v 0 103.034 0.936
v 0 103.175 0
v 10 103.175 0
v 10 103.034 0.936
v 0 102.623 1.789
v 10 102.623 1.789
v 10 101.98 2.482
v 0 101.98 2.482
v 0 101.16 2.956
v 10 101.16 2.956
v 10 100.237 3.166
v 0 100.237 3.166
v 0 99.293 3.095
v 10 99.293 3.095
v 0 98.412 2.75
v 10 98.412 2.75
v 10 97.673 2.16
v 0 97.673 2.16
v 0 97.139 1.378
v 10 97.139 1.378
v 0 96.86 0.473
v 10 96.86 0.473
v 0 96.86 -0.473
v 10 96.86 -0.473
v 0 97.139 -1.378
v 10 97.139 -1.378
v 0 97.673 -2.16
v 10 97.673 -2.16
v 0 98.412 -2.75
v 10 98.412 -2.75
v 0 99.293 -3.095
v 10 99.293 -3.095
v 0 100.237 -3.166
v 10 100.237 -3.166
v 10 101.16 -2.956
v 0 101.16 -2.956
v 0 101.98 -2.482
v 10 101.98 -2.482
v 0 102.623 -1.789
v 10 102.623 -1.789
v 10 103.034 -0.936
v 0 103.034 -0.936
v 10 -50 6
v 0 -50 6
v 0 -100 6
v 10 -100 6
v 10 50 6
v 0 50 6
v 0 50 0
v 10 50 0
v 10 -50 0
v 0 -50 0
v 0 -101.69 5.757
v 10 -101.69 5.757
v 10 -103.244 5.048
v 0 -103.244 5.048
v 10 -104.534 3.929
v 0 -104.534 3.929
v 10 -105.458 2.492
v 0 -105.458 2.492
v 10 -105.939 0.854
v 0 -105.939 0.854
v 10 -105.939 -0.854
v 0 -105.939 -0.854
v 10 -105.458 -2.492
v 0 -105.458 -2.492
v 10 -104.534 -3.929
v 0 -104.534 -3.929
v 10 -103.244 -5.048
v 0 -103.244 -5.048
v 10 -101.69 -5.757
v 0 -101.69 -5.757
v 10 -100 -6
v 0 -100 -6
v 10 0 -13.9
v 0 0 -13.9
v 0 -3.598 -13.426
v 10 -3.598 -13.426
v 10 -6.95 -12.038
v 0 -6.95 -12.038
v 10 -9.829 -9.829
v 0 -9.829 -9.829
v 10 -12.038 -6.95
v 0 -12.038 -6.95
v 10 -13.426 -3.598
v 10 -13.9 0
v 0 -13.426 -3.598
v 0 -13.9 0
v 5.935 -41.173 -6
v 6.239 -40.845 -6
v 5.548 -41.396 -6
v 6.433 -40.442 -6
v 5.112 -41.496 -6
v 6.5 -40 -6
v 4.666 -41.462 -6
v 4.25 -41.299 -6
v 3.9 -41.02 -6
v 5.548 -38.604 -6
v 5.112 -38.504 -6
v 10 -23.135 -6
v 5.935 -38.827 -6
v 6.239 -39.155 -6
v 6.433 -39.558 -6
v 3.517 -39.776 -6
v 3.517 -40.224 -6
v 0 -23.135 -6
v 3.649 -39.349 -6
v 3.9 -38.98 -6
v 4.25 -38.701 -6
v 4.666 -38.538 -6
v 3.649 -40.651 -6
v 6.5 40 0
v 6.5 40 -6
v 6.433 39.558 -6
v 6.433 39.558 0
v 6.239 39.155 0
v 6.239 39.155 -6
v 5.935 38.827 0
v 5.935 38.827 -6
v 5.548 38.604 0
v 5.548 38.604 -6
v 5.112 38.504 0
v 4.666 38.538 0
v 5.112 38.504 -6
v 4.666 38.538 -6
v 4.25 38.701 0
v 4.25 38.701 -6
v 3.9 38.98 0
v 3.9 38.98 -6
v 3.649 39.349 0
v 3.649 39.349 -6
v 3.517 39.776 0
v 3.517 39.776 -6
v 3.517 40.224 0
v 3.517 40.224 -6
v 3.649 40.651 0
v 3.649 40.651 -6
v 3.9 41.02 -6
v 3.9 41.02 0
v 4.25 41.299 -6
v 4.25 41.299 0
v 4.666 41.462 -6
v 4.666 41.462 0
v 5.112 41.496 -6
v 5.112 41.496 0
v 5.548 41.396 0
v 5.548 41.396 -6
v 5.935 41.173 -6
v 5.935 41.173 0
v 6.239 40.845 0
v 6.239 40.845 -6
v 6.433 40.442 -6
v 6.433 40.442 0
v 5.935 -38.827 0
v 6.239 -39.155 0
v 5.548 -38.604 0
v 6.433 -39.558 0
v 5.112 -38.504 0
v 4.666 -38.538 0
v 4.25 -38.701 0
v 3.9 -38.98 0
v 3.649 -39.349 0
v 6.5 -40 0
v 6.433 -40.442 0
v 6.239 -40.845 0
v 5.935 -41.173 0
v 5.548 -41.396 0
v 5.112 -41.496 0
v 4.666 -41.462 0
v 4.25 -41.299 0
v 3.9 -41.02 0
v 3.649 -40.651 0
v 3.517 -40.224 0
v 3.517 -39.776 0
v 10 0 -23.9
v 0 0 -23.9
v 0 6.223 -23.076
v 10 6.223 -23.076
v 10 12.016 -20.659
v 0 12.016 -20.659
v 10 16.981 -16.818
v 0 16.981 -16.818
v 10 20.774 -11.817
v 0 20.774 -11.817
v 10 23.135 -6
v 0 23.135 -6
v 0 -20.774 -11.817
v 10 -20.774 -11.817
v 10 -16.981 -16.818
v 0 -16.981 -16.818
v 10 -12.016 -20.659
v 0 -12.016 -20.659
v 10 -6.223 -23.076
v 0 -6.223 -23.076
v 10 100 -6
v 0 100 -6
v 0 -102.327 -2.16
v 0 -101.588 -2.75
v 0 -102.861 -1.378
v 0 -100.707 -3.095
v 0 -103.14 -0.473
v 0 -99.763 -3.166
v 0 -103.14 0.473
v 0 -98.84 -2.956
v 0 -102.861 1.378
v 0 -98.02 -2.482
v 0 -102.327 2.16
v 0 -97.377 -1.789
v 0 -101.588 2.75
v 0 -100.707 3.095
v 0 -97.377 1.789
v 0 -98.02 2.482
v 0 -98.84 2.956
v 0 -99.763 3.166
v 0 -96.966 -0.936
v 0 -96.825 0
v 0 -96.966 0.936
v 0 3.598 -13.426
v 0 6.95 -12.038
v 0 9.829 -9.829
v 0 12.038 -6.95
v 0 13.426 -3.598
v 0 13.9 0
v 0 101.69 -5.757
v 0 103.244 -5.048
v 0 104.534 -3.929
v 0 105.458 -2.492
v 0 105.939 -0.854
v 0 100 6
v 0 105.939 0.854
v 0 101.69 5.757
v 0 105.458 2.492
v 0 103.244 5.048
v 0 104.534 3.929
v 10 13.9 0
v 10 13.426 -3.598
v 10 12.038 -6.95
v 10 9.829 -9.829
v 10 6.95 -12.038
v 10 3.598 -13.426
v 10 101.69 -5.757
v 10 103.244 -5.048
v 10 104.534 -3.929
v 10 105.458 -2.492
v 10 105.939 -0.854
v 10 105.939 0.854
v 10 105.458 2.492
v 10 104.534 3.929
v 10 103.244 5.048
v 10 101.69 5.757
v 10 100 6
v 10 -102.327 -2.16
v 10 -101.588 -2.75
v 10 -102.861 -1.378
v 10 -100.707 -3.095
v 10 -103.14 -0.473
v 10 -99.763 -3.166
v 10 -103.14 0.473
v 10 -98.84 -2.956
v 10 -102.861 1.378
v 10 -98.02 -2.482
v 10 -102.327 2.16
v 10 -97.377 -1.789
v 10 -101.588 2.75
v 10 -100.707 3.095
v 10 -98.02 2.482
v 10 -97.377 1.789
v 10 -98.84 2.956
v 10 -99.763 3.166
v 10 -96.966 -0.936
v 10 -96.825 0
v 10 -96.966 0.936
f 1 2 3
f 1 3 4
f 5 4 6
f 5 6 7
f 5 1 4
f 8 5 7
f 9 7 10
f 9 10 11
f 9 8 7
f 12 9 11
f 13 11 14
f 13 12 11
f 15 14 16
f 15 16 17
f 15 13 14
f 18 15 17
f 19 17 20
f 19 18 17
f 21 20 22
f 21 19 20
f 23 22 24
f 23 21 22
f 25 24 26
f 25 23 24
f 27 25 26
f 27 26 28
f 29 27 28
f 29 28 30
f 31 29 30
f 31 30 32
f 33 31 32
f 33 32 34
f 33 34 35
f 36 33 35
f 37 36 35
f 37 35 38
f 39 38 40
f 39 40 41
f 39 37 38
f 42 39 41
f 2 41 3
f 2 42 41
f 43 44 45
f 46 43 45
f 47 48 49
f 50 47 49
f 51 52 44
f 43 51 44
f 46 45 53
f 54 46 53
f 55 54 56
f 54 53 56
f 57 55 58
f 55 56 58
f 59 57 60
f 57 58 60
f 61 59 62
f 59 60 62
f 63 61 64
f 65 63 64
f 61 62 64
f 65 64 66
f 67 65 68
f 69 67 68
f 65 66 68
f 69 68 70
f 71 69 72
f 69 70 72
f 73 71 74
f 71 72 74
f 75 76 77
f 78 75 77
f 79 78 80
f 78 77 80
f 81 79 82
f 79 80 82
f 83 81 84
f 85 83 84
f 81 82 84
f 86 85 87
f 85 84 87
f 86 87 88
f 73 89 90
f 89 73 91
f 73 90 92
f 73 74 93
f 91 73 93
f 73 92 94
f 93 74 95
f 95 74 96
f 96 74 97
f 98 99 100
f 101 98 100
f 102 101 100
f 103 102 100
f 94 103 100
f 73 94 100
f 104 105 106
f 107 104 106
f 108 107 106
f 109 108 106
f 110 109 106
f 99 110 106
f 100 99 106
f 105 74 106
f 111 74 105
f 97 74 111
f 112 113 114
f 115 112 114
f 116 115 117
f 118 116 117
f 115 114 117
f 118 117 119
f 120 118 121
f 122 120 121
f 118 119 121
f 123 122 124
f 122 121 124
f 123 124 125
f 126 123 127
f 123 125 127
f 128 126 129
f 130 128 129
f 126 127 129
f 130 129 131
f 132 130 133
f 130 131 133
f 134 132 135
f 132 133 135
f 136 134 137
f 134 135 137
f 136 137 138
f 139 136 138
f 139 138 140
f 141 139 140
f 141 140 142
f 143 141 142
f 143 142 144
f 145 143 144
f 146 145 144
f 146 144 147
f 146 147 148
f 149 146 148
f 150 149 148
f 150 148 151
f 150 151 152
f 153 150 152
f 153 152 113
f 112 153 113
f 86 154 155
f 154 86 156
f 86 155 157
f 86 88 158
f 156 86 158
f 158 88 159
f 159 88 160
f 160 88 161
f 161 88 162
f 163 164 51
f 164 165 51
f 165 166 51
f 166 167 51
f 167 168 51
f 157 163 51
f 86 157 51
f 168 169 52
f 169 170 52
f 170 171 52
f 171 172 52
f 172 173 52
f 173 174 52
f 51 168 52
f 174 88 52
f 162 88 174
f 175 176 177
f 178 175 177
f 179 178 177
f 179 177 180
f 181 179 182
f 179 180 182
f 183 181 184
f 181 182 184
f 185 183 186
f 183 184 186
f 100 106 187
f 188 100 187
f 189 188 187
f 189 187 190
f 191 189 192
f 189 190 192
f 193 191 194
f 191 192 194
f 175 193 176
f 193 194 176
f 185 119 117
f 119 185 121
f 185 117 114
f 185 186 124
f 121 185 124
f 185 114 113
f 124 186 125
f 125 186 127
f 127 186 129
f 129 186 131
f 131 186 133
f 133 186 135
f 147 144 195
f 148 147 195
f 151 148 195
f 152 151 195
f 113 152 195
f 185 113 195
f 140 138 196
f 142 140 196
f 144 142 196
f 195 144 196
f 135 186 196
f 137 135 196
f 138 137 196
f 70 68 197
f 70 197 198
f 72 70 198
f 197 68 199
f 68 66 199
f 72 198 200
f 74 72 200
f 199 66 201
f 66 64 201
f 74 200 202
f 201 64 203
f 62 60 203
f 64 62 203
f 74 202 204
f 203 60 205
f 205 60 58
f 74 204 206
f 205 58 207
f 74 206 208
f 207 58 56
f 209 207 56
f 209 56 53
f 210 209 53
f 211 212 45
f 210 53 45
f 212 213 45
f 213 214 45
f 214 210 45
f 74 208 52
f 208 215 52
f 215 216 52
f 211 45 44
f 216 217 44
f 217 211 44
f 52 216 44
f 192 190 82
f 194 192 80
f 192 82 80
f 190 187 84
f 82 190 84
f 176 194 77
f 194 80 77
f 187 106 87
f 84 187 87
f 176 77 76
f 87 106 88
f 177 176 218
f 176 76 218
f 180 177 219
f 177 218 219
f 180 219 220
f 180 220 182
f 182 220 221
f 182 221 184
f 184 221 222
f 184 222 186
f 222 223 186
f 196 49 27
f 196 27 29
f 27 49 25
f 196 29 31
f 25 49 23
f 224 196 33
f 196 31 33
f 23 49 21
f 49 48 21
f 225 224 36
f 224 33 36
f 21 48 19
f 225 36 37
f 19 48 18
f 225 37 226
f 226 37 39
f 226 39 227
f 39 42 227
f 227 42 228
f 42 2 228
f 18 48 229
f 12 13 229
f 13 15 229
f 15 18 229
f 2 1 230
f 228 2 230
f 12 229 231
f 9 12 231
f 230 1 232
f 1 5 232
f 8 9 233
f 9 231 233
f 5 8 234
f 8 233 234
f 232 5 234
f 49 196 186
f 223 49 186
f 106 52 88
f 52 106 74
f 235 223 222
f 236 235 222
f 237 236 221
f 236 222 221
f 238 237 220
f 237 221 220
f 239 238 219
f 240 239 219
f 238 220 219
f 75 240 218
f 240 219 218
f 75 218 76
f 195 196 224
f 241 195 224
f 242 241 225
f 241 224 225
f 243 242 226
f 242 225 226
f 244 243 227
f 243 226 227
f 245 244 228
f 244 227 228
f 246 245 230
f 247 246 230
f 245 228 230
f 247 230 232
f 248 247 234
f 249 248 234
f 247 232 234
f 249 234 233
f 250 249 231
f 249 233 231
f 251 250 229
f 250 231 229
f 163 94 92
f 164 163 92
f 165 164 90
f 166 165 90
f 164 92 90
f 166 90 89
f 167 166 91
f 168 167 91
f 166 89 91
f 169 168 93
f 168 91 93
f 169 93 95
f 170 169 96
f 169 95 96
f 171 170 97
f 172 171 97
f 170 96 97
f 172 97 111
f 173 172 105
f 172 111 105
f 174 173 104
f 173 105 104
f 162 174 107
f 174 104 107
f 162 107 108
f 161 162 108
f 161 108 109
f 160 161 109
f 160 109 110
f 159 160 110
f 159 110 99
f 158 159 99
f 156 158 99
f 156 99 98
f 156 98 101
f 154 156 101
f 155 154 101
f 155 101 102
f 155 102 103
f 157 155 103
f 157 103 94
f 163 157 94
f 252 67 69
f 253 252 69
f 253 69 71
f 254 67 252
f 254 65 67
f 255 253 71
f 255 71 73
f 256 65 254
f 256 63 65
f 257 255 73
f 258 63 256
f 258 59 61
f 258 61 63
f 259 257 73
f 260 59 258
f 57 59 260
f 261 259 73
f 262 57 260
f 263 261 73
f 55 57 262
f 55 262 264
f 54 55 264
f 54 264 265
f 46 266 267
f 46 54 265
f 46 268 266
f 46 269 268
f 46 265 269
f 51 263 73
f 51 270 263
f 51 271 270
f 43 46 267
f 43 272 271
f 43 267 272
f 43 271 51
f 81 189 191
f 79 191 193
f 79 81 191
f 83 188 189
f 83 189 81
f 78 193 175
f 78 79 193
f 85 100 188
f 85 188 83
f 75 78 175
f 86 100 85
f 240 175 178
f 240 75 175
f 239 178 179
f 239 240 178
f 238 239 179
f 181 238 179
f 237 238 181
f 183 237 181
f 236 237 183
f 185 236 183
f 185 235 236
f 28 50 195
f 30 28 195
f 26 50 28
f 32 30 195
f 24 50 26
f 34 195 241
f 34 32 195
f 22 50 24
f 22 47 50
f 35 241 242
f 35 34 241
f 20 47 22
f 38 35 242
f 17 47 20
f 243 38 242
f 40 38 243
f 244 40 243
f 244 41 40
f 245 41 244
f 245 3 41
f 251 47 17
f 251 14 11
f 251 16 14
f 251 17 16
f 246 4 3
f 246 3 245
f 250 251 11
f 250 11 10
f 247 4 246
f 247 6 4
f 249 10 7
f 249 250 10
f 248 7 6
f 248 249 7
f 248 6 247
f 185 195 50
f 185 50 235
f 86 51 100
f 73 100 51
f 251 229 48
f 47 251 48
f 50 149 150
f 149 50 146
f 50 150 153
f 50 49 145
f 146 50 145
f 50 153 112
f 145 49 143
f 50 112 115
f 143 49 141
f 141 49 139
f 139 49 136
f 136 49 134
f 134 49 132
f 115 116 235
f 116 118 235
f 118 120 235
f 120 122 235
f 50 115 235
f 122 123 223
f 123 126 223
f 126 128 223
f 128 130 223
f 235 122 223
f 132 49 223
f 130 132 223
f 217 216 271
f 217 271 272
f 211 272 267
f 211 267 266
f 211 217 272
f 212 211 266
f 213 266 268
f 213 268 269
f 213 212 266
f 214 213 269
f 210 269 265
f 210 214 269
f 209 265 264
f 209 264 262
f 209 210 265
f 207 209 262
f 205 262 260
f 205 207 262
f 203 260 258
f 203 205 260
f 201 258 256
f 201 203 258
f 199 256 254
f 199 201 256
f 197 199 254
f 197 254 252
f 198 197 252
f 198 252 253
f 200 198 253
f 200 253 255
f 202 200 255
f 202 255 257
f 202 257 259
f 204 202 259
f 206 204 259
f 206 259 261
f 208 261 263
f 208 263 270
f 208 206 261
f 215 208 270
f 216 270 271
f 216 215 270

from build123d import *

# Parameters (mm, degrees)
F0_R     = 3.175
F1_DEPTH = 10
F2_R     = 1.5
F3_DEPTH = 25


with BuildPart() as f1:
    # F0 (on Right) → F1 (new body)
    with BuildSketch(Plane.YZ):
        with BuildLine():
            Line((0, -23.9), (0, -13.9))
            ThreePointArc((0, -13.9), (-9.828784, -9.828784), (-13.9, 0))
            Line((-13.9, 0), (-50, 0))
            Line((-50, 0), (-50, 6))
            Line((-50, 6), (-100, 6))
            ThreePointArc((-100, 6), (-106, 0), (-100, -6))
            Line((-100, -6), (-23.134606, -6))
            ThreePointArc((-23.134606, -6), (-14.625491, -18.902513), (0, -23.9))
        make_face()
        with Locations((-100, 0)):
            Circle(F0_R, mode=Mode.SUBTRACT)
        with BuildLine():
            ThreePointArc((13.9, 0), (9.828784, -9.828784), (0, -13.9))
            Line((0, -13.9), (0, -23.9))
            ThreePointArc((0, -23.9), (14.625491, -18.902513), (23.134606, -6))
            Line((23.134606, -6), (100, -6))
            ThreePointArc((100, -6), (106, 0), (100, 6))
            Line((100, 6), (50, 6))
            Line((50, 6), (50, 0))
            Line((50, 0), (13.9, 0))
        make_face()
        with Locations((100, 0)):
            Circle(F0_R, mode=Mode.SUBTRACT)
    extrude(amount=F1_DEPTH)

    # F2 (on face) → F3 (cut)
    with BuildSketch(Plane(origin=(0, 0, -6), x_dir=(1, 0, 0), z_dir=(0, 0, -1))):
        with Locations((5, 40)):
            Circle(F2_R)
        with Locations((5, -40)):
            Circle(F2_R)
    extrude(amount=-F3_DEPTH, mode=Mode.SUBTRACT)


solid = f1.part
